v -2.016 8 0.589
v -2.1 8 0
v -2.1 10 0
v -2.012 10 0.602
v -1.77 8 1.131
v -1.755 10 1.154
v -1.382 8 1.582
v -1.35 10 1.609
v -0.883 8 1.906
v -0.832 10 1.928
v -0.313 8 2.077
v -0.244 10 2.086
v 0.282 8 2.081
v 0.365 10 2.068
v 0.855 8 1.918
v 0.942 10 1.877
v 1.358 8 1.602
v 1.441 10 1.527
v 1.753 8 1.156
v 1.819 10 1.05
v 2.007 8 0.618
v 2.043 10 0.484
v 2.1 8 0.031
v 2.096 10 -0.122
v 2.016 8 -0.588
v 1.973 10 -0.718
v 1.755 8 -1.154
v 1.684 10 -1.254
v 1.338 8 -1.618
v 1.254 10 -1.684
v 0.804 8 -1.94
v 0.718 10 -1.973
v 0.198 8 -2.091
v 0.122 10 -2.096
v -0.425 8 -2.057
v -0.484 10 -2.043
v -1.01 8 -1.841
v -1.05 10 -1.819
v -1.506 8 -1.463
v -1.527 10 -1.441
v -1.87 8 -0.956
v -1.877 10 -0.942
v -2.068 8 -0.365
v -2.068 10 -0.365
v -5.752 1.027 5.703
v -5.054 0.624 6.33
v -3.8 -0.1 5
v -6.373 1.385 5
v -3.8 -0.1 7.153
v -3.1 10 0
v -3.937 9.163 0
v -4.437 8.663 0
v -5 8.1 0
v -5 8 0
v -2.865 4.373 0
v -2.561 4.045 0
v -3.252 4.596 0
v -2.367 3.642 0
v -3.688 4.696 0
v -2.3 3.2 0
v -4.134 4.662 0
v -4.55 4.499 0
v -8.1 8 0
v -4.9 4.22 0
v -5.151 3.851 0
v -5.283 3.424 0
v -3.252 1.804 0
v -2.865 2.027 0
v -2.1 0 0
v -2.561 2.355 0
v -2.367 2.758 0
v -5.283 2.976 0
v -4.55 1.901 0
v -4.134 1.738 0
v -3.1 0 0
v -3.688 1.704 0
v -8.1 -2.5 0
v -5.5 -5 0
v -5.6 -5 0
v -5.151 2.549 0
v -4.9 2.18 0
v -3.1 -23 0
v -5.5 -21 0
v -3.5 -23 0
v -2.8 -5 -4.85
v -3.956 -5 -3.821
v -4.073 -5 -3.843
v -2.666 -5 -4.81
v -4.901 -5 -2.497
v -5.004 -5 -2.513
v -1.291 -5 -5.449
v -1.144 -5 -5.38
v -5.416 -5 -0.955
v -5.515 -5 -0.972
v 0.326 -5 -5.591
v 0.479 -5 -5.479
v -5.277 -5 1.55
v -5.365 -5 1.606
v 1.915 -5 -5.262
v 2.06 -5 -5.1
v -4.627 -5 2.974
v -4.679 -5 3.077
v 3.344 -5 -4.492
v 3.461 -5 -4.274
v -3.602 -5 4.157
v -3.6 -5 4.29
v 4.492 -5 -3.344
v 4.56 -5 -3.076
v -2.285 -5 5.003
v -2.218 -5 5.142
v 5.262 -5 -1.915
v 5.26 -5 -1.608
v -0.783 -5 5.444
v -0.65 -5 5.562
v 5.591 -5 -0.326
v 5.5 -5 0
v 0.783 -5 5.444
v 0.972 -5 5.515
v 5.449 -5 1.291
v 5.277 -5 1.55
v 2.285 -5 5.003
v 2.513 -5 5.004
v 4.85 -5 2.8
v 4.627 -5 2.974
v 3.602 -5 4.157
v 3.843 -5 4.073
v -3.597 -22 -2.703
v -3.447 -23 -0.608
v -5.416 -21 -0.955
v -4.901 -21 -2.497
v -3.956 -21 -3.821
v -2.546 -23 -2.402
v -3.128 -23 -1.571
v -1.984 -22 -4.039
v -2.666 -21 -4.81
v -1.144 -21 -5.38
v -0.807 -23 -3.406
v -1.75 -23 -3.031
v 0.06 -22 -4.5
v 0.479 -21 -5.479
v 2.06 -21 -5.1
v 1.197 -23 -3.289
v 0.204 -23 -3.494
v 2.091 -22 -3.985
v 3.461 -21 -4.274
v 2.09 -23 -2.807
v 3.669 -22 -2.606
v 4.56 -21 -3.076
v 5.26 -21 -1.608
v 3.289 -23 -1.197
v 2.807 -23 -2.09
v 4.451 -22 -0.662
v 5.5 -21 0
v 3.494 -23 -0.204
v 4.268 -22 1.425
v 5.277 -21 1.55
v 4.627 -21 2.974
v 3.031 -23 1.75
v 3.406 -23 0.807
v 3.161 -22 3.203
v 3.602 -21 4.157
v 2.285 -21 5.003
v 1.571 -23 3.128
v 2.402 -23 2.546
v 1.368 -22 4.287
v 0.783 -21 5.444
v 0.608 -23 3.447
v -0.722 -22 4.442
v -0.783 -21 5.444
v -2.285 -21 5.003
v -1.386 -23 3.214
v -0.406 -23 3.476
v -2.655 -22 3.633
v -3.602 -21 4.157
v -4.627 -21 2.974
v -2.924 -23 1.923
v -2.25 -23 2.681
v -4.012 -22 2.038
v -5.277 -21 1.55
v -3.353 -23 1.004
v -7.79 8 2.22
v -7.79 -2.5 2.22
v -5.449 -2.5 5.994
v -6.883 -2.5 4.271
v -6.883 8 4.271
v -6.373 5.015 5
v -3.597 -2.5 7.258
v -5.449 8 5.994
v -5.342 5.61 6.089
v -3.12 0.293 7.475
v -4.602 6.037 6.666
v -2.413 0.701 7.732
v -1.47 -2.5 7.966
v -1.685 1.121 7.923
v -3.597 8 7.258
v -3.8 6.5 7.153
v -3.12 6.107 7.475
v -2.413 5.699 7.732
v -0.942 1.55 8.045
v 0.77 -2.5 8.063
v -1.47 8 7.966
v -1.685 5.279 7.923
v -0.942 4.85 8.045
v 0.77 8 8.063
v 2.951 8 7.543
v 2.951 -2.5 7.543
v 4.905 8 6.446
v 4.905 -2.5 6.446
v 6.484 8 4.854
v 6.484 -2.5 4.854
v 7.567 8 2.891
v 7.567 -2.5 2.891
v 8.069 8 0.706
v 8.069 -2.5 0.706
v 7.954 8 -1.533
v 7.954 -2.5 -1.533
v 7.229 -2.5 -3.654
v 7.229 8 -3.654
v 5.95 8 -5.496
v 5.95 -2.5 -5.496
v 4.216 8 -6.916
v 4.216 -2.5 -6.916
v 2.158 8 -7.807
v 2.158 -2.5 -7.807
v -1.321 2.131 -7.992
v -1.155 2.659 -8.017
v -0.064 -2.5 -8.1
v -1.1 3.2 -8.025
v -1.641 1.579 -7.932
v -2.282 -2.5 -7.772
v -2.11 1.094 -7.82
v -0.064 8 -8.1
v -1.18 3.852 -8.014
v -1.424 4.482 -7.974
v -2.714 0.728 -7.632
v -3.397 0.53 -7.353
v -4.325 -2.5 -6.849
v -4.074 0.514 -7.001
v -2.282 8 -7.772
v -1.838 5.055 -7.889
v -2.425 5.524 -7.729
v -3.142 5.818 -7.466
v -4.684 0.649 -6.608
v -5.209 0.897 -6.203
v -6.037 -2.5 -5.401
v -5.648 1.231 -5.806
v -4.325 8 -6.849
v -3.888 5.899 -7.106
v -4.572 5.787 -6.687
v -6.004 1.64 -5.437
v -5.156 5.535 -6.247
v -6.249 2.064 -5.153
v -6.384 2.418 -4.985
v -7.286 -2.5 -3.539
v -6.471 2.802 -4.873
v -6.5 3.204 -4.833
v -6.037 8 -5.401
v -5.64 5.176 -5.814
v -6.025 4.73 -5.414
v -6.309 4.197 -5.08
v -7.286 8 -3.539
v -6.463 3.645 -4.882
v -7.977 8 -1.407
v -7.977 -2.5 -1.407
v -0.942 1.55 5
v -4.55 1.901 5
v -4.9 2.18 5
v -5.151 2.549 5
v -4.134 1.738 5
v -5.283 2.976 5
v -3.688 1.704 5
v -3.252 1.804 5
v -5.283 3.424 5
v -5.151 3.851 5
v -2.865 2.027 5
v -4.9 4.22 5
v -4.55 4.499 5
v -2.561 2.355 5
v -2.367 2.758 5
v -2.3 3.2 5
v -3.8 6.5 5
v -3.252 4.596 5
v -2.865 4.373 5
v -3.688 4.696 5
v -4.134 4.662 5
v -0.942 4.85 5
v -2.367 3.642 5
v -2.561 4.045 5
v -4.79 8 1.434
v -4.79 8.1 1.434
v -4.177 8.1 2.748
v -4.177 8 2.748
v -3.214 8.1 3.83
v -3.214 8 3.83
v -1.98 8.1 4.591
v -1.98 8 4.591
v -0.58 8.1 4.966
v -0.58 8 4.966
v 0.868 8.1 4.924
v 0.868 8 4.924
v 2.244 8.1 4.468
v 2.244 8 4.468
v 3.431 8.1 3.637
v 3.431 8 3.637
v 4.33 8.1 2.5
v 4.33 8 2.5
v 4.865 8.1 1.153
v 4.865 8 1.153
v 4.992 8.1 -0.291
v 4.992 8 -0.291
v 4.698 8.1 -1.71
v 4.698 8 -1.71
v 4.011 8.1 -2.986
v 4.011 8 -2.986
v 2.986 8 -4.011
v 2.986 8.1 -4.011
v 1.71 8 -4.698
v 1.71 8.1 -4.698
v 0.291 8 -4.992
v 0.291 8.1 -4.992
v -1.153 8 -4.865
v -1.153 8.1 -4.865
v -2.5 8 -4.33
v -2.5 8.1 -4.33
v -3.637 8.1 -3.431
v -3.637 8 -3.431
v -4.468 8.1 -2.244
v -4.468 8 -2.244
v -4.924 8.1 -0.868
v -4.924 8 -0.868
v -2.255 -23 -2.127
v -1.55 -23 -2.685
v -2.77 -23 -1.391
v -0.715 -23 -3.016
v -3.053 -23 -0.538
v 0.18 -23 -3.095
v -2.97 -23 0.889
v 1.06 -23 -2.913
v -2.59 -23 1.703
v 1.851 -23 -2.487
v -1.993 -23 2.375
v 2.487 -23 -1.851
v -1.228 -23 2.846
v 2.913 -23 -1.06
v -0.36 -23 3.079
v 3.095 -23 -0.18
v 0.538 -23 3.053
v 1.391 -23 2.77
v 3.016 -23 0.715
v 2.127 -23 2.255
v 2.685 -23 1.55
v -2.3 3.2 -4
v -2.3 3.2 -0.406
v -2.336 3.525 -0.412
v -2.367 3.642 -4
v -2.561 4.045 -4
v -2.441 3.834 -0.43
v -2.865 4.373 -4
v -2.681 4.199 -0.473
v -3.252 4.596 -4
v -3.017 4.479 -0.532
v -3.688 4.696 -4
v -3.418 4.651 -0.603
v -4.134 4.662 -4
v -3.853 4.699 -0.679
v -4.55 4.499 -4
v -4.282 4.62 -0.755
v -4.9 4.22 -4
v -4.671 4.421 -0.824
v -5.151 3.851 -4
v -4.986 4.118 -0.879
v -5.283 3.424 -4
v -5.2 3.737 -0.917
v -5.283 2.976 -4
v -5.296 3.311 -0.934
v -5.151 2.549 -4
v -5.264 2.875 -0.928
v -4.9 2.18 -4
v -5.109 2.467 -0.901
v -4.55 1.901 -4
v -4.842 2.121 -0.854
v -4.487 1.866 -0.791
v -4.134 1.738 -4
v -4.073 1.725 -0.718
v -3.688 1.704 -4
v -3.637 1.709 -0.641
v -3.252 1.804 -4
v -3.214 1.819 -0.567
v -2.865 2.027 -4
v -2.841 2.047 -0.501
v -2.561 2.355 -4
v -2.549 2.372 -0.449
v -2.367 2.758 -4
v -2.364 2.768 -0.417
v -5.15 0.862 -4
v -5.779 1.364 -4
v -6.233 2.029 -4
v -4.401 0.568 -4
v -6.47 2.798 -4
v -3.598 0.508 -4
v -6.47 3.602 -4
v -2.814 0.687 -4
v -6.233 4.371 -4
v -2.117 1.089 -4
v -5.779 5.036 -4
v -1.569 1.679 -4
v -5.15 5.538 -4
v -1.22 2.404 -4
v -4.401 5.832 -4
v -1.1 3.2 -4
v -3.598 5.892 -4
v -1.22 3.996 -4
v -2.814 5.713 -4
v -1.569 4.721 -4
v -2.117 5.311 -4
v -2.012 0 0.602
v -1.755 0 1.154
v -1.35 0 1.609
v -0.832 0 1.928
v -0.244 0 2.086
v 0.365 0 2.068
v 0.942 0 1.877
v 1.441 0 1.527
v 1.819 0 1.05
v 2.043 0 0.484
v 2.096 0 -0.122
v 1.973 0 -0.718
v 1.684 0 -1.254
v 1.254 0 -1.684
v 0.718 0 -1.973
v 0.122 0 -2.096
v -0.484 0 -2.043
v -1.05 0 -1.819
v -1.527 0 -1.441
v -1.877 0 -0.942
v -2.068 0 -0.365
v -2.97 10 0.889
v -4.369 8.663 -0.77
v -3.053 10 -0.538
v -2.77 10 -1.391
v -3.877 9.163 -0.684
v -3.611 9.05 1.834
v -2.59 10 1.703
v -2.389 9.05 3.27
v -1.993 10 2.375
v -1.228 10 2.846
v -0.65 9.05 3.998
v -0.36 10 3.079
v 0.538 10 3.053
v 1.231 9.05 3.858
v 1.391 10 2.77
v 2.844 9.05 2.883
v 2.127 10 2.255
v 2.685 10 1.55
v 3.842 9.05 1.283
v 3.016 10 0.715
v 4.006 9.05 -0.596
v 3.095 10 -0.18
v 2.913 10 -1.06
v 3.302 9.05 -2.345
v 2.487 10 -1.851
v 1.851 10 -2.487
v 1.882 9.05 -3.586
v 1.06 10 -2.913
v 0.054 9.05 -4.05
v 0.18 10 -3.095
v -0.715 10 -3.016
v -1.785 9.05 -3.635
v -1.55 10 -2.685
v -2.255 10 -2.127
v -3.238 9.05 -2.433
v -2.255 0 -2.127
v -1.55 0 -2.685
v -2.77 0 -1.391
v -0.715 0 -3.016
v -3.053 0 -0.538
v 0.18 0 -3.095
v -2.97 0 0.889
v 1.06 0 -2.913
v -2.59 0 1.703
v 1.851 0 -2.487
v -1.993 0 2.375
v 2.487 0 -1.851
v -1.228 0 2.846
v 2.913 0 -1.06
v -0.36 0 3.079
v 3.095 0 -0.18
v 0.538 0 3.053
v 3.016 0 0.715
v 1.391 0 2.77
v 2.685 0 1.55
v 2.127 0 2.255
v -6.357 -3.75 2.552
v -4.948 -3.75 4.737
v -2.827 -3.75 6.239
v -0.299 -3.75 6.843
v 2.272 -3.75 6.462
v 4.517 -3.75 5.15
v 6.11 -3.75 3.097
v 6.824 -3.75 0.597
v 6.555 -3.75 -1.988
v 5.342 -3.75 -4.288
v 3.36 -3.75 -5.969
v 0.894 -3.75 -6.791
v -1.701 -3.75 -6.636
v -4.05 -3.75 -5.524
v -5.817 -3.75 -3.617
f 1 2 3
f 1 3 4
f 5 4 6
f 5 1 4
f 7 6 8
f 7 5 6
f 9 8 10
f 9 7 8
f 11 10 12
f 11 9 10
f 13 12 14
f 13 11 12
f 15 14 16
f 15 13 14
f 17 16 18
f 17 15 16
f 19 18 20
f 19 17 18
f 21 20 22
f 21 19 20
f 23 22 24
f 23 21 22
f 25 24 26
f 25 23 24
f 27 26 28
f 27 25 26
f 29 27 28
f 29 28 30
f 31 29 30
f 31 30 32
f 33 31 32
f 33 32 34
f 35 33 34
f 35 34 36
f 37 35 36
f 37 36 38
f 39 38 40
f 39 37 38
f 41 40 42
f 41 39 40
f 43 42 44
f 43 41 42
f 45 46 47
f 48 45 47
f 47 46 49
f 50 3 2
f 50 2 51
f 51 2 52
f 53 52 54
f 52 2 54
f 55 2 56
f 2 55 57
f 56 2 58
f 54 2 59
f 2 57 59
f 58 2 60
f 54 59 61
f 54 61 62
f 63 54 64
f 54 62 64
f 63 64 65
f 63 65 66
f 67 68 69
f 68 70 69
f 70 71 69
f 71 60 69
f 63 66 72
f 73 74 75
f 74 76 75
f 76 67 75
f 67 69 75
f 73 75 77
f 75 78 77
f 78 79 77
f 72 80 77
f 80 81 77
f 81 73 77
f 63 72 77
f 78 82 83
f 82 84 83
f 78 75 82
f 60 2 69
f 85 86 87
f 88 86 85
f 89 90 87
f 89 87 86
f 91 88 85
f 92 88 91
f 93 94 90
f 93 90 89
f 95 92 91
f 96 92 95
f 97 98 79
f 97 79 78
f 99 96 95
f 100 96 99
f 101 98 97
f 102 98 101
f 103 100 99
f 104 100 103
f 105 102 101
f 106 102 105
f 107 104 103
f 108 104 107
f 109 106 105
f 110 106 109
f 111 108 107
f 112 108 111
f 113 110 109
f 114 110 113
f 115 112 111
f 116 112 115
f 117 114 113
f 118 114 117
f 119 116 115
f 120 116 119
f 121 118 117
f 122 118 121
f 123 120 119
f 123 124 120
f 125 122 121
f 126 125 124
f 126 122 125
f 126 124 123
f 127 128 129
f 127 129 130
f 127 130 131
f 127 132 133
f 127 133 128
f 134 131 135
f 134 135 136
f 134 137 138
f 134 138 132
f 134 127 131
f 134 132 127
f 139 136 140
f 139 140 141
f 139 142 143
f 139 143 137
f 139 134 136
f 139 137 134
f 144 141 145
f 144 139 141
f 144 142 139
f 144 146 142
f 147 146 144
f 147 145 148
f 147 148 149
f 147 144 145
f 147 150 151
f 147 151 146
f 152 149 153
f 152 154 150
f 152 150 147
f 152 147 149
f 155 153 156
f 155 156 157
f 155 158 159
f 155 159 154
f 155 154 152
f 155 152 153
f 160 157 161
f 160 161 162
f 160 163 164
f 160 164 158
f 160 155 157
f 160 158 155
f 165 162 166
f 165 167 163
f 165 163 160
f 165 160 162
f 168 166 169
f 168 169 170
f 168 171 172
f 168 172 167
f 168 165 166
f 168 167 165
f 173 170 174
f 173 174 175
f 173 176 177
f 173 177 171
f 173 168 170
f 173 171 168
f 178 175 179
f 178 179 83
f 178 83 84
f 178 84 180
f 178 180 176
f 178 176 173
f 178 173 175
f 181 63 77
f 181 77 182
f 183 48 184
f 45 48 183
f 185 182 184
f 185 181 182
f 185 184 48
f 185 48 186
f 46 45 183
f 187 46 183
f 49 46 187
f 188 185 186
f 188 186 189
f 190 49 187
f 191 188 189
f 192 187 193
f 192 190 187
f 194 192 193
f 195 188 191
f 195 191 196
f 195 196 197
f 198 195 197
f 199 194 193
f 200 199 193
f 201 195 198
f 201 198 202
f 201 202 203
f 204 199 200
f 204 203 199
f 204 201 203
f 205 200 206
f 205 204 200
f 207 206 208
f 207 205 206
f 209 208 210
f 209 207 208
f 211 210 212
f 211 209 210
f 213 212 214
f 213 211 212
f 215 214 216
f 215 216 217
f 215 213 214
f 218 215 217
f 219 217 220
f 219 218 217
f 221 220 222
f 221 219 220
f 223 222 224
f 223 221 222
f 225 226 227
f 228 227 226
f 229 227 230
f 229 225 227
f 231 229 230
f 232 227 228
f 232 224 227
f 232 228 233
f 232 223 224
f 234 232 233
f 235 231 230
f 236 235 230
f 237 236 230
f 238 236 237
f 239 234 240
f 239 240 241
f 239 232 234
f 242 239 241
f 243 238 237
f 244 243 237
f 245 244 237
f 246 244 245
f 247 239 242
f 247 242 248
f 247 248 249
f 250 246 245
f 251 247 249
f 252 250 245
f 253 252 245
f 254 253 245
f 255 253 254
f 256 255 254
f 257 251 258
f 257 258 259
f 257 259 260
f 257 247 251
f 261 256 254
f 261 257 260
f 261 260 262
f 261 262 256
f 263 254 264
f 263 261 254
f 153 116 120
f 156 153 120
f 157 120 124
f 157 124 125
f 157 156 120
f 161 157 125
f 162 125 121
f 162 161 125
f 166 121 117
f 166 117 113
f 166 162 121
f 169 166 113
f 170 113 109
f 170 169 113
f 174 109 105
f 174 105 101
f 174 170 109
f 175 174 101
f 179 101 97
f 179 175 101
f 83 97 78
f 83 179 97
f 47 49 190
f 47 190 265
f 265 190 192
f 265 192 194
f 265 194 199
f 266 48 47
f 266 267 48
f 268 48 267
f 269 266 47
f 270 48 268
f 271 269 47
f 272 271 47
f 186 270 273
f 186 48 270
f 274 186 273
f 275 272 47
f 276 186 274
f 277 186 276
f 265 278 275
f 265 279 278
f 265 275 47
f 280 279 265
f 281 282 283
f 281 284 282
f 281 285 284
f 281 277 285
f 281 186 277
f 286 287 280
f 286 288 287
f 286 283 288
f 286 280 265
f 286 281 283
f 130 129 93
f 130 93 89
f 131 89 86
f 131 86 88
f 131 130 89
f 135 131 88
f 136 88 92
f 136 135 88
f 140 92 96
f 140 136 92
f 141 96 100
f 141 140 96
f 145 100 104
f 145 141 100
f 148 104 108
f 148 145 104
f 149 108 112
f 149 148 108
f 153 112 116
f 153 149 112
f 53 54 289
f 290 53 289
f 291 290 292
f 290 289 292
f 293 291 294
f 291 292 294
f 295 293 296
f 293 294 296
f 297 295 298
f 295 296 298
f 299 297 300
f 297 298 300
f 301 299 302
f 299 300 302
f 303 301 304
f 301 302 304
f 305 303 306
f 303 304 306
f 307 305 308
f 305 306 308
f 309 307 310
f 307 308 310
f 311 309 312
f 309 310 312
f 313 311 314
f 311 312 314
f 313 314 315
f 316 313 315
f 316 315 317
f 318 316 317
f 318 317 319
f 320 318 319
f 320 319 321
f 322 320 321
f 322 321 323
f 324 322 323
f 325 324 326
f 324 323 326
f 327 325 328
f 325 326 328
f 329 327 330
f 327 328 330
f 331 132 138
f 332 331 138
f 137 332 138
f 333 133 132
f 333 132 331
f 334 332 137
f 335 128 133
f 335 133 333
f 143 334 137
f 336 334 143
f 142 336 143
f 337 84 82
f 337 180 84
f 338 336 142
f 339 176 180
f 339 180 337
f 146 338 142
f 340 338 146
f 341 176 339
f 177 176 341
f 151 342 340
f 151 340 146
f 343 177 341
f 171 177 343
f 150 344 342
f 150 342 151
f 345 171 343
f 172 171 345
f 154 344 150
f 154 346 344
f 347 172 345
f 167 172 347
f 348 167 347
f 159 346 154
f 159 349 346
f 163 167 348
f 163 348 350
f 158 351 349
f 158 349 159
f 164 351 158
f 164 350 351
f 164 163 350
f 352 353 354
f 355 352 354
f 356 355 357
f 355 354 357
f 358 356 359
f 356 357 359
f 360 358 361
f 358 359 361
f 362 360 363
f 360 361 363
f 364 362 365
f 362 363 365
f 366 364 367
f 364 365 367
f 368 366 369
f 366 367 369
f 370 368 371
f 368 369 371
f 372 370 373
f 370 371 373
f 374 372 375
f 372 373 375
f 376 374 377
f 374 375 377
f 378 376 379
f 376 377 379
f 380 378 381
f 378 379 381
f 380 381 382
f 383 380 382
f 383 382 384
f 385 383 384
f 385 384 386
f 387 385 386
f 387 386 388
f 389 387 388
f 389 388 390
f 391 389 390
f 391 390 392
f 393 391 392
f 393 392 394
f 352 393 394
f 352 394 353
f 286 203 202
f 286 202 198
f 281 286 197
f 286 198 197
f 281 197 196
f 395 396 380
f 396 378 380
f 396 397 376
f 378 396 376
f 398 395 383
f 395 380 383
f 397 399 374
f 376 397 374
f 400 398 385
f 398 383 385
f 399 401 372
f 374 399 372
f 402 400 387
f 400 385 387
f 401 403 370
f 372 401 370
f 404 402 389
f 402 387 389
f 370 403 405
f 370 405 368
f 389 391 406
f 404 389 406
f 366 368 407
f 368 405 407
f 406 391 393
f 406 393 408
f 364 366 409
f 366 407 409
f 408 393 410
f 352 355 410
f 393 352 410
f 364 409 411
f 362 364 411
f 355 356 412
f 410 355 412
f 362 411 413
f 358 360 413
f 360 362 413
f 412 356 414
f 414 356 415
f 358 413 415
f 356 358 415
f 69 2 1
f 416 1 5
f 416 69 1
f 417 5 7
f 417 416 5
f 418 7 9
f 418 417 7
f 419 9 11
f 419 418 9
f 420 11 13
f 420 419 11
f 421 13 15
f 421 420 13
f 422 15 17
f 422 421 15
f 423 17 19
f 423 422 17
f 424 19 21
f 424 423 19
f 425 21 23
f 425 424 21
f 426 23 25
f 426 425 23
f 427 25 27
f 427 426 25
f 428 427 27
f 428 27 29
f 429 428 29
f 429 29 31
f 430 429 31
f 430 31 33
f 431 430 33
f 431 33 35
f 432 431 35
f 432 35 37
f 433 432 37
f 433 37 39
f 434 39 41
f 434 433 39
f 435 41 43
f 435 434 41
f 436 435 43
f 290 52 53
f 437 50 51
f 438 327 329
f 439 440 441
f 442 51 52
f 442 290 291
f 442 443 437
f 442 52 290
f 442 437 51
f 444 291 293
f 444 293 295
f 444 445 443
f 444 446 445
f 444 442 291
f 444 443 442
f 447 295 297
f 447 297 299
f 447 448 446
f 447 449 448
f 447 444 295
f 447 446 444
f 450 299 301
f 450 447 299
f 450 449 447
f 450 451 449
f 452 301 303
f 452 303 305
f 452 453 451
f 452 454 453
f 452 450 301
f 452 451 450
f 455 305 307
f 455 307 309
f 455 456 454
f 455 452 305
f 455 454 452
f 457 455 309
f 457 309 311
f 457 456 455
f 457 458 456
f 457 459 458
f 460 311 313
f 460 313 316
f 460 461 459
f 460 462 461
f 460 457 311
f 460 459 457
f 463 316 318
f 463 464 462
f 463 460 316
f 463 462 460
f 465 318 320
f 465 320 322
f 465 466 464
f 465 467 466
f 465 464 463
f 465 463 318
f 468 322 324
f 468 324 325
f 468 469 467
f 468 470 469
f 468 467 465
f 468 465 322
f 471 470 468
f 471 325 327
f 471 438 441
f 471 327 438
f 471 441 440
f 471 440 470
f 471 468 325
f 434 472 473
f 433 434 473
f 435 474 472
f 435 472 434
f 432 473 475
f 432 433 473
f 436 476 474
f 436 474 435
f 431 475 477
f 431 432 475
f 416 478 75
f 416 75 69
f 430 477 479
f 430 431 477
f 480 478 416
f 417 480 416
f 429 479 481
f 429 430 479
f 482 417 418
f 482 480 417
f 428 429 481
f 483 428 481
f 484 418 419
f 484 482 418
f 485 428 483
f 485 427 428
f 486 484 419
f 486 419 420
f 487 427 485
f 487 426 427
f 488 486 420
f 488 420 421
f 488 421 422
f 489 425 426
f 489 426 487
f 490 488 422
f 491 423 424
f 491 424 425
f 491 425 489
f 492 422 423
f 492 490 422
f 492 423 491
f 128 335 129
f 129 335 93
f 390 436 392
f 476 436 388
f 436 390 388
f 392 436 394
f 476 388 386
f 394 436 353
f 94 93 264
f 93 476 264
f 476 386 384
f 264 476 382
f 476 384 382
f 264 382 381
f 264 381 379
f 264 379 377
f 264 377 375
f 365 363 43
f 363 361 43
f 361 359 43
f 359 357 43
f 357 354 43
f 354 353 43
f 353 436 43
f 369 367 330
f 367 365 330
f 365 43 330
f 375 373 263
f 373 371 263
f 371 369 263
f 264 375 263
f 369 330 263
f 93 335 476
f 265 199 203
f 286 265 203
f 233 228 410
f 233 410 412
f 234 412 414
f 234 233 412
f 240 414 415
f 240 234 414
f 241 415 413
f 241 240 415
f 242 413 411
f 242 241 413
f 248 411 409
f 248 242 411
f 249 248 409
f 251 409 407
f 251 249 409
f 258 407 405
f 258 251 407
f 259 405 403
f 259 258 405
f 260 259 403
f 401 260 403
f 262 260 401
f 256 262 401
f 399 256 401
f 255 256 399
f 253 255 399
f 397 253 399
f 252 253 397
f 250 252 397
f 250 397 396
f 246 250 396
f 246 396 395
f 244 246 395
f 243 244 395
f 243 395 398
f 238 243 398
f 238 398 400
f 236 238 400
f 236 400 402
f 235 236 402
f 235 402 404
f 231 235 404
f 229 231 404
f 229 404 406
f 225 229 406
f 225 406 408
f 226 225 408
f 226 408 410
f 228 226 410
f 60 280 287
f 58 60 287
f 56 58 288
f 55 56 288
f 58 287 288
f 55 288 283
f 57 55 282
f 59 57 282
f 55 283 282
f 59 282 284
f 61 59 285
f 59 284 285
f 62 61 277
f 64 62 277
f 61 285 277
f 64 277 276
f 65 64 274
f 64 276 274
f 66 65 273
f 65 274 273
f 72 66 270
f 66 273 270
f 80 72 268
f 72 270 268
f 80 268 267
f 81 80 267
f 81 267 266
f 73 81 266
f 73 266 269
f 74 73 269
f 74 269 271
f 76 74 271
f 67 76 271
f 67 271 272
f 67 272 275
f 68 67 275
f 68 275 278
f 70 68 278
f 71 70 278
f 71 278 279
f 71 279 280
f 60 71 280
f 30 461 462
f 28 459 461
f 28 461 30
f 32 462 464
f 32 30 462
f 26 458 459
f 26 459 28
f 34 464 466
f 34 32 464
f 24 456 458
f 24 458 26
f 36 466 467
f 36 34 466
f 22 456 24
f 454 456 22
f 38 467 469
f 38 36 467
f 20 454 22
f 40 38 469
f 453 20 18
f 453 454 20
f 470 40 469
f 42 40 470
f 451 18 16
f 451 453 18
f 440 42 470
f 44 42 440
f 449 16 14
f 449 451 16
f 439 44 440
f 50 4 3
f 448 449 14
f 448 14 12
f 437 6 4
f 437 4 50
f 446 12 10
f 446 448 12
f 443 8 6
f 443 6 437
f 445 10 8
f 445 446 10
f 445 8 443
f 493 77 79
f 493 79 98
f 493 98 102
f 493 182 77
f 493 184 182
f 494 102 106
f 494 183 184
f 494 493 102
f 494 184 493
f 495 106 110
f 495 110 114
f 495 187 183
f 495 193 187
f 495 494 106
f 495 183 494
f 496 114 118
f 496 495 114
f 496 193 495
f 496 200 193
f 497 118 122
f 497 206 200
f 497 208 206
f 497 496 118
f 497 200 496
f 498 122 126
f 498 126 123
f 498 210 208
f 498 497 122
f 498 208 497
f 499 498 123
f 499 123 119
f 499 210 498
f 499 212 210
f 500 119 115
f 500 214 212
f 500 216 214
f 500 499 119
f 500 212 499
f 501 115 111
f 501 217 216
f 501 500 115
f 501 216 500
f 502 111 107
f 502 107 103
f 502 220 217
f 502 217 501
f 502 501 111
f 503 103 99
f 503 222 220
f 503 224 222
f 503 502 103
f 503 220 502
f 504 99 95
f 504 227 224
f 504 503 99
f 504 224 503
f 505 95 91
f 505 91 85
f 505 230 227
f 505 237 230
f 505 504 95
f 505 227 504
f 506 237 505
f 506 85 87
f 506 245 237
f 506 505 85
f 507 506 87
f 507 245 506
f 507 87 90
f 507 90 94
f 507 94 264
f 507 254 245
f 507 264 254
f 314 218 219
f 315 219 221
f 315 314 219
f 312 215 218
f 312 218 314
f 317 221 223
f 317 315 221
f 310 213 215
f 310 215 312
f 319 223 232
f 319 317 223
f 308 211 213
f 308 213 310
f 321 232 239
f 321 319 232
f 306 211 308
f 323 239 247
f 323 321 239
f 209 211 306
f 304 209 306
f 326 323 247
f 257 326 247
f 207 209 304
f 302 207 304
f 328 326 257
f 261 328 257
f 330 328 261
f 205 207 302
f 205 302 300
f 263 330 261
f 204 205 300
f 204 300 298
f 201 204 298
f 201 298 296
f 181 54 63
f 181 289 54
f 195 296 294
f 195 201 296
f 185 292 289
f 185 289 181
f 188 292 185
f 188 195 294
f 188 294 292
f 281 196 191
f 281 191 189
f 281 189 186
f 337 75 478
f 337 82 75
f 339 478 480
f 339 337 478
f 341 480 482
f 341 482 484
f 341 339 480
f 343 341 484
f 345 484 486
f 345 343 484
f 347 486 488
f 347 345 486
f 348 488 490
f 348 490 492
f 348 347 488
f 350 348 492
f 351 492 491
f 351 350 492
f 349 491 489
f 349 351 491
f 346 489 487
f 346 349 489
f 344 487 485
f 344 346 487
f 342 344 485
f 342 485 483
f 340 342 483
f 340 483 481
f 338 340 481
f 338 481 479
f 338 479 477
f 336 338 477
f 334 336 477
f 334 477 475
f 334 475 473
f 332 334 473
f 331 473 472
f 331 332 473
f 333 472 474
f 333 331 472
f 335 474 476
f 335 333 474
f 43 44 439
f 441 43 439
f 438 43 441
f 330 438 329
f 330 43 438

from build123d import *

# Parameters (mm, degrees)
REVOLUTION_ANGLE = 350
SKETCH002_R      = 1.5
POCKET_DEPTH     = 22.101
POCKET001_DEPTH  = 9
SKETCH003_R      = 2.7
POCKET002_DEPTH  = 11
SKETCH004_R      = 8.1
SKETCH004_R_2    = 5.5
POCKET003_DEPTH  = 18
CHAMFER_SIZE     = 2.5
CHAMFER001_SIZE  = 2
PAD_DEPTH        = 2
CHAMFER002_SIZE  = 1.9


with BuildPart() as part:
    # Sketch → Revolution (revolve)
    with BuildSketch(Plane.XY):
        Polygon((-2.1, 8), (-2.1, 0), (-3.1, 0), (-3.1, -23), (-8.1, -23), (-8.1, 8), align=None)
    revolve(axis=Axis((0, 0, 0), (0, 1, 0)), revolution_arc=REVOLUTION_ANGLE)

    # Sketch002 (on DatumPlane) → Pocket (cut, through all)
    with BuildSketch(Plane.XY.offset(14)):
        with Locations((-3.8, 3.2)):
            Circle(SKETCH002_R)
    extrude(amount=-POCKET_DEPTH, mode=Mode.SUBTRACT)

    # Sketch001 (on DatumPlane) → Pocket001 (cut)
    with BuildSketch(Plane.XY.offset(14)):
        Polygon((-3.8, -0.1), (-0.942116, 1.55), (-0.942116, 4.85), (-3.8, 6.5), (-6.657884, 4.85), (-6.657884, 1.55), align=None)
    extrude(amount=-POCKET001_DEPTH, mode=Mode.SUBTRACT)

    # Sketch003 (on DatumPlane) → Pocket002 (cut)
    with BuildSketch(Plane.XY.offset(-15)):
        with Locations((-3.8, 3.2)):
            Circle(SKETCH003_R)
    extrude(amount=POCKET002_DEPTH, mode=Mode.SUBTRACT)

    # Sketch004 (on Face8 of Pocket002) → Pocket003 (cut)
    with BuildSketch(Plane.XZ.offset(23)):
        Circle(SKETCH004_R)
        Circle(SKETCH004_R_2, mode=Mode.SUBTRACT)
    extrude(amount=-POCKET003_DEPTH, mode=Mode.SUBTRACT)

    # Chamfer
    chamfer_edges = [part.edges().sort_by_distance(p)[0] for p in [
        (0.705962, -5, -8.069177),
    ]]
    chamfer(chamfer_edges, length=CHAMFER_SIZE)

    # Chamfer001
    chamfer001_edges = [part.edges().sort_by_distance(p)[0] for p in [
        (0.479357, -23, -5.479071),
    ]]
    chamfer(chamfer001_edges, length=CHAMFER001_SIZE)

    # Sketch005 (on Face10 of Chamfer001) → Pad (join)
    with BuildSketch(Plane(origin=(0, 8, 0), x_dir=(-1, 0, 0), z_dir=(0, 1, 0))):
        with BuildLine():
            ThreePointArc((5, 0), (-4.980973, 0.435779), (4.924039, -0.868241))
            Line((2.068096, -0.364661), (4.924039, -0.868241))
            ThreePointArc((2.1, 0), (-2.092009, 0.183027), (2.068096, -0.364661))
            Line((2.1, 0), (5, 0))
        make_face()
    extrude(amount=PAD_DEPTH)

    # Chamfer002
    chamfer002_edges = [part.edges().sort_by_distance(p)[0] for p in [
        (4.980973, 10, 0.435779),
    ]]
    chamfer(chamfer002_edges, length=CHAMFER002_SIZE)


solid = part.part
